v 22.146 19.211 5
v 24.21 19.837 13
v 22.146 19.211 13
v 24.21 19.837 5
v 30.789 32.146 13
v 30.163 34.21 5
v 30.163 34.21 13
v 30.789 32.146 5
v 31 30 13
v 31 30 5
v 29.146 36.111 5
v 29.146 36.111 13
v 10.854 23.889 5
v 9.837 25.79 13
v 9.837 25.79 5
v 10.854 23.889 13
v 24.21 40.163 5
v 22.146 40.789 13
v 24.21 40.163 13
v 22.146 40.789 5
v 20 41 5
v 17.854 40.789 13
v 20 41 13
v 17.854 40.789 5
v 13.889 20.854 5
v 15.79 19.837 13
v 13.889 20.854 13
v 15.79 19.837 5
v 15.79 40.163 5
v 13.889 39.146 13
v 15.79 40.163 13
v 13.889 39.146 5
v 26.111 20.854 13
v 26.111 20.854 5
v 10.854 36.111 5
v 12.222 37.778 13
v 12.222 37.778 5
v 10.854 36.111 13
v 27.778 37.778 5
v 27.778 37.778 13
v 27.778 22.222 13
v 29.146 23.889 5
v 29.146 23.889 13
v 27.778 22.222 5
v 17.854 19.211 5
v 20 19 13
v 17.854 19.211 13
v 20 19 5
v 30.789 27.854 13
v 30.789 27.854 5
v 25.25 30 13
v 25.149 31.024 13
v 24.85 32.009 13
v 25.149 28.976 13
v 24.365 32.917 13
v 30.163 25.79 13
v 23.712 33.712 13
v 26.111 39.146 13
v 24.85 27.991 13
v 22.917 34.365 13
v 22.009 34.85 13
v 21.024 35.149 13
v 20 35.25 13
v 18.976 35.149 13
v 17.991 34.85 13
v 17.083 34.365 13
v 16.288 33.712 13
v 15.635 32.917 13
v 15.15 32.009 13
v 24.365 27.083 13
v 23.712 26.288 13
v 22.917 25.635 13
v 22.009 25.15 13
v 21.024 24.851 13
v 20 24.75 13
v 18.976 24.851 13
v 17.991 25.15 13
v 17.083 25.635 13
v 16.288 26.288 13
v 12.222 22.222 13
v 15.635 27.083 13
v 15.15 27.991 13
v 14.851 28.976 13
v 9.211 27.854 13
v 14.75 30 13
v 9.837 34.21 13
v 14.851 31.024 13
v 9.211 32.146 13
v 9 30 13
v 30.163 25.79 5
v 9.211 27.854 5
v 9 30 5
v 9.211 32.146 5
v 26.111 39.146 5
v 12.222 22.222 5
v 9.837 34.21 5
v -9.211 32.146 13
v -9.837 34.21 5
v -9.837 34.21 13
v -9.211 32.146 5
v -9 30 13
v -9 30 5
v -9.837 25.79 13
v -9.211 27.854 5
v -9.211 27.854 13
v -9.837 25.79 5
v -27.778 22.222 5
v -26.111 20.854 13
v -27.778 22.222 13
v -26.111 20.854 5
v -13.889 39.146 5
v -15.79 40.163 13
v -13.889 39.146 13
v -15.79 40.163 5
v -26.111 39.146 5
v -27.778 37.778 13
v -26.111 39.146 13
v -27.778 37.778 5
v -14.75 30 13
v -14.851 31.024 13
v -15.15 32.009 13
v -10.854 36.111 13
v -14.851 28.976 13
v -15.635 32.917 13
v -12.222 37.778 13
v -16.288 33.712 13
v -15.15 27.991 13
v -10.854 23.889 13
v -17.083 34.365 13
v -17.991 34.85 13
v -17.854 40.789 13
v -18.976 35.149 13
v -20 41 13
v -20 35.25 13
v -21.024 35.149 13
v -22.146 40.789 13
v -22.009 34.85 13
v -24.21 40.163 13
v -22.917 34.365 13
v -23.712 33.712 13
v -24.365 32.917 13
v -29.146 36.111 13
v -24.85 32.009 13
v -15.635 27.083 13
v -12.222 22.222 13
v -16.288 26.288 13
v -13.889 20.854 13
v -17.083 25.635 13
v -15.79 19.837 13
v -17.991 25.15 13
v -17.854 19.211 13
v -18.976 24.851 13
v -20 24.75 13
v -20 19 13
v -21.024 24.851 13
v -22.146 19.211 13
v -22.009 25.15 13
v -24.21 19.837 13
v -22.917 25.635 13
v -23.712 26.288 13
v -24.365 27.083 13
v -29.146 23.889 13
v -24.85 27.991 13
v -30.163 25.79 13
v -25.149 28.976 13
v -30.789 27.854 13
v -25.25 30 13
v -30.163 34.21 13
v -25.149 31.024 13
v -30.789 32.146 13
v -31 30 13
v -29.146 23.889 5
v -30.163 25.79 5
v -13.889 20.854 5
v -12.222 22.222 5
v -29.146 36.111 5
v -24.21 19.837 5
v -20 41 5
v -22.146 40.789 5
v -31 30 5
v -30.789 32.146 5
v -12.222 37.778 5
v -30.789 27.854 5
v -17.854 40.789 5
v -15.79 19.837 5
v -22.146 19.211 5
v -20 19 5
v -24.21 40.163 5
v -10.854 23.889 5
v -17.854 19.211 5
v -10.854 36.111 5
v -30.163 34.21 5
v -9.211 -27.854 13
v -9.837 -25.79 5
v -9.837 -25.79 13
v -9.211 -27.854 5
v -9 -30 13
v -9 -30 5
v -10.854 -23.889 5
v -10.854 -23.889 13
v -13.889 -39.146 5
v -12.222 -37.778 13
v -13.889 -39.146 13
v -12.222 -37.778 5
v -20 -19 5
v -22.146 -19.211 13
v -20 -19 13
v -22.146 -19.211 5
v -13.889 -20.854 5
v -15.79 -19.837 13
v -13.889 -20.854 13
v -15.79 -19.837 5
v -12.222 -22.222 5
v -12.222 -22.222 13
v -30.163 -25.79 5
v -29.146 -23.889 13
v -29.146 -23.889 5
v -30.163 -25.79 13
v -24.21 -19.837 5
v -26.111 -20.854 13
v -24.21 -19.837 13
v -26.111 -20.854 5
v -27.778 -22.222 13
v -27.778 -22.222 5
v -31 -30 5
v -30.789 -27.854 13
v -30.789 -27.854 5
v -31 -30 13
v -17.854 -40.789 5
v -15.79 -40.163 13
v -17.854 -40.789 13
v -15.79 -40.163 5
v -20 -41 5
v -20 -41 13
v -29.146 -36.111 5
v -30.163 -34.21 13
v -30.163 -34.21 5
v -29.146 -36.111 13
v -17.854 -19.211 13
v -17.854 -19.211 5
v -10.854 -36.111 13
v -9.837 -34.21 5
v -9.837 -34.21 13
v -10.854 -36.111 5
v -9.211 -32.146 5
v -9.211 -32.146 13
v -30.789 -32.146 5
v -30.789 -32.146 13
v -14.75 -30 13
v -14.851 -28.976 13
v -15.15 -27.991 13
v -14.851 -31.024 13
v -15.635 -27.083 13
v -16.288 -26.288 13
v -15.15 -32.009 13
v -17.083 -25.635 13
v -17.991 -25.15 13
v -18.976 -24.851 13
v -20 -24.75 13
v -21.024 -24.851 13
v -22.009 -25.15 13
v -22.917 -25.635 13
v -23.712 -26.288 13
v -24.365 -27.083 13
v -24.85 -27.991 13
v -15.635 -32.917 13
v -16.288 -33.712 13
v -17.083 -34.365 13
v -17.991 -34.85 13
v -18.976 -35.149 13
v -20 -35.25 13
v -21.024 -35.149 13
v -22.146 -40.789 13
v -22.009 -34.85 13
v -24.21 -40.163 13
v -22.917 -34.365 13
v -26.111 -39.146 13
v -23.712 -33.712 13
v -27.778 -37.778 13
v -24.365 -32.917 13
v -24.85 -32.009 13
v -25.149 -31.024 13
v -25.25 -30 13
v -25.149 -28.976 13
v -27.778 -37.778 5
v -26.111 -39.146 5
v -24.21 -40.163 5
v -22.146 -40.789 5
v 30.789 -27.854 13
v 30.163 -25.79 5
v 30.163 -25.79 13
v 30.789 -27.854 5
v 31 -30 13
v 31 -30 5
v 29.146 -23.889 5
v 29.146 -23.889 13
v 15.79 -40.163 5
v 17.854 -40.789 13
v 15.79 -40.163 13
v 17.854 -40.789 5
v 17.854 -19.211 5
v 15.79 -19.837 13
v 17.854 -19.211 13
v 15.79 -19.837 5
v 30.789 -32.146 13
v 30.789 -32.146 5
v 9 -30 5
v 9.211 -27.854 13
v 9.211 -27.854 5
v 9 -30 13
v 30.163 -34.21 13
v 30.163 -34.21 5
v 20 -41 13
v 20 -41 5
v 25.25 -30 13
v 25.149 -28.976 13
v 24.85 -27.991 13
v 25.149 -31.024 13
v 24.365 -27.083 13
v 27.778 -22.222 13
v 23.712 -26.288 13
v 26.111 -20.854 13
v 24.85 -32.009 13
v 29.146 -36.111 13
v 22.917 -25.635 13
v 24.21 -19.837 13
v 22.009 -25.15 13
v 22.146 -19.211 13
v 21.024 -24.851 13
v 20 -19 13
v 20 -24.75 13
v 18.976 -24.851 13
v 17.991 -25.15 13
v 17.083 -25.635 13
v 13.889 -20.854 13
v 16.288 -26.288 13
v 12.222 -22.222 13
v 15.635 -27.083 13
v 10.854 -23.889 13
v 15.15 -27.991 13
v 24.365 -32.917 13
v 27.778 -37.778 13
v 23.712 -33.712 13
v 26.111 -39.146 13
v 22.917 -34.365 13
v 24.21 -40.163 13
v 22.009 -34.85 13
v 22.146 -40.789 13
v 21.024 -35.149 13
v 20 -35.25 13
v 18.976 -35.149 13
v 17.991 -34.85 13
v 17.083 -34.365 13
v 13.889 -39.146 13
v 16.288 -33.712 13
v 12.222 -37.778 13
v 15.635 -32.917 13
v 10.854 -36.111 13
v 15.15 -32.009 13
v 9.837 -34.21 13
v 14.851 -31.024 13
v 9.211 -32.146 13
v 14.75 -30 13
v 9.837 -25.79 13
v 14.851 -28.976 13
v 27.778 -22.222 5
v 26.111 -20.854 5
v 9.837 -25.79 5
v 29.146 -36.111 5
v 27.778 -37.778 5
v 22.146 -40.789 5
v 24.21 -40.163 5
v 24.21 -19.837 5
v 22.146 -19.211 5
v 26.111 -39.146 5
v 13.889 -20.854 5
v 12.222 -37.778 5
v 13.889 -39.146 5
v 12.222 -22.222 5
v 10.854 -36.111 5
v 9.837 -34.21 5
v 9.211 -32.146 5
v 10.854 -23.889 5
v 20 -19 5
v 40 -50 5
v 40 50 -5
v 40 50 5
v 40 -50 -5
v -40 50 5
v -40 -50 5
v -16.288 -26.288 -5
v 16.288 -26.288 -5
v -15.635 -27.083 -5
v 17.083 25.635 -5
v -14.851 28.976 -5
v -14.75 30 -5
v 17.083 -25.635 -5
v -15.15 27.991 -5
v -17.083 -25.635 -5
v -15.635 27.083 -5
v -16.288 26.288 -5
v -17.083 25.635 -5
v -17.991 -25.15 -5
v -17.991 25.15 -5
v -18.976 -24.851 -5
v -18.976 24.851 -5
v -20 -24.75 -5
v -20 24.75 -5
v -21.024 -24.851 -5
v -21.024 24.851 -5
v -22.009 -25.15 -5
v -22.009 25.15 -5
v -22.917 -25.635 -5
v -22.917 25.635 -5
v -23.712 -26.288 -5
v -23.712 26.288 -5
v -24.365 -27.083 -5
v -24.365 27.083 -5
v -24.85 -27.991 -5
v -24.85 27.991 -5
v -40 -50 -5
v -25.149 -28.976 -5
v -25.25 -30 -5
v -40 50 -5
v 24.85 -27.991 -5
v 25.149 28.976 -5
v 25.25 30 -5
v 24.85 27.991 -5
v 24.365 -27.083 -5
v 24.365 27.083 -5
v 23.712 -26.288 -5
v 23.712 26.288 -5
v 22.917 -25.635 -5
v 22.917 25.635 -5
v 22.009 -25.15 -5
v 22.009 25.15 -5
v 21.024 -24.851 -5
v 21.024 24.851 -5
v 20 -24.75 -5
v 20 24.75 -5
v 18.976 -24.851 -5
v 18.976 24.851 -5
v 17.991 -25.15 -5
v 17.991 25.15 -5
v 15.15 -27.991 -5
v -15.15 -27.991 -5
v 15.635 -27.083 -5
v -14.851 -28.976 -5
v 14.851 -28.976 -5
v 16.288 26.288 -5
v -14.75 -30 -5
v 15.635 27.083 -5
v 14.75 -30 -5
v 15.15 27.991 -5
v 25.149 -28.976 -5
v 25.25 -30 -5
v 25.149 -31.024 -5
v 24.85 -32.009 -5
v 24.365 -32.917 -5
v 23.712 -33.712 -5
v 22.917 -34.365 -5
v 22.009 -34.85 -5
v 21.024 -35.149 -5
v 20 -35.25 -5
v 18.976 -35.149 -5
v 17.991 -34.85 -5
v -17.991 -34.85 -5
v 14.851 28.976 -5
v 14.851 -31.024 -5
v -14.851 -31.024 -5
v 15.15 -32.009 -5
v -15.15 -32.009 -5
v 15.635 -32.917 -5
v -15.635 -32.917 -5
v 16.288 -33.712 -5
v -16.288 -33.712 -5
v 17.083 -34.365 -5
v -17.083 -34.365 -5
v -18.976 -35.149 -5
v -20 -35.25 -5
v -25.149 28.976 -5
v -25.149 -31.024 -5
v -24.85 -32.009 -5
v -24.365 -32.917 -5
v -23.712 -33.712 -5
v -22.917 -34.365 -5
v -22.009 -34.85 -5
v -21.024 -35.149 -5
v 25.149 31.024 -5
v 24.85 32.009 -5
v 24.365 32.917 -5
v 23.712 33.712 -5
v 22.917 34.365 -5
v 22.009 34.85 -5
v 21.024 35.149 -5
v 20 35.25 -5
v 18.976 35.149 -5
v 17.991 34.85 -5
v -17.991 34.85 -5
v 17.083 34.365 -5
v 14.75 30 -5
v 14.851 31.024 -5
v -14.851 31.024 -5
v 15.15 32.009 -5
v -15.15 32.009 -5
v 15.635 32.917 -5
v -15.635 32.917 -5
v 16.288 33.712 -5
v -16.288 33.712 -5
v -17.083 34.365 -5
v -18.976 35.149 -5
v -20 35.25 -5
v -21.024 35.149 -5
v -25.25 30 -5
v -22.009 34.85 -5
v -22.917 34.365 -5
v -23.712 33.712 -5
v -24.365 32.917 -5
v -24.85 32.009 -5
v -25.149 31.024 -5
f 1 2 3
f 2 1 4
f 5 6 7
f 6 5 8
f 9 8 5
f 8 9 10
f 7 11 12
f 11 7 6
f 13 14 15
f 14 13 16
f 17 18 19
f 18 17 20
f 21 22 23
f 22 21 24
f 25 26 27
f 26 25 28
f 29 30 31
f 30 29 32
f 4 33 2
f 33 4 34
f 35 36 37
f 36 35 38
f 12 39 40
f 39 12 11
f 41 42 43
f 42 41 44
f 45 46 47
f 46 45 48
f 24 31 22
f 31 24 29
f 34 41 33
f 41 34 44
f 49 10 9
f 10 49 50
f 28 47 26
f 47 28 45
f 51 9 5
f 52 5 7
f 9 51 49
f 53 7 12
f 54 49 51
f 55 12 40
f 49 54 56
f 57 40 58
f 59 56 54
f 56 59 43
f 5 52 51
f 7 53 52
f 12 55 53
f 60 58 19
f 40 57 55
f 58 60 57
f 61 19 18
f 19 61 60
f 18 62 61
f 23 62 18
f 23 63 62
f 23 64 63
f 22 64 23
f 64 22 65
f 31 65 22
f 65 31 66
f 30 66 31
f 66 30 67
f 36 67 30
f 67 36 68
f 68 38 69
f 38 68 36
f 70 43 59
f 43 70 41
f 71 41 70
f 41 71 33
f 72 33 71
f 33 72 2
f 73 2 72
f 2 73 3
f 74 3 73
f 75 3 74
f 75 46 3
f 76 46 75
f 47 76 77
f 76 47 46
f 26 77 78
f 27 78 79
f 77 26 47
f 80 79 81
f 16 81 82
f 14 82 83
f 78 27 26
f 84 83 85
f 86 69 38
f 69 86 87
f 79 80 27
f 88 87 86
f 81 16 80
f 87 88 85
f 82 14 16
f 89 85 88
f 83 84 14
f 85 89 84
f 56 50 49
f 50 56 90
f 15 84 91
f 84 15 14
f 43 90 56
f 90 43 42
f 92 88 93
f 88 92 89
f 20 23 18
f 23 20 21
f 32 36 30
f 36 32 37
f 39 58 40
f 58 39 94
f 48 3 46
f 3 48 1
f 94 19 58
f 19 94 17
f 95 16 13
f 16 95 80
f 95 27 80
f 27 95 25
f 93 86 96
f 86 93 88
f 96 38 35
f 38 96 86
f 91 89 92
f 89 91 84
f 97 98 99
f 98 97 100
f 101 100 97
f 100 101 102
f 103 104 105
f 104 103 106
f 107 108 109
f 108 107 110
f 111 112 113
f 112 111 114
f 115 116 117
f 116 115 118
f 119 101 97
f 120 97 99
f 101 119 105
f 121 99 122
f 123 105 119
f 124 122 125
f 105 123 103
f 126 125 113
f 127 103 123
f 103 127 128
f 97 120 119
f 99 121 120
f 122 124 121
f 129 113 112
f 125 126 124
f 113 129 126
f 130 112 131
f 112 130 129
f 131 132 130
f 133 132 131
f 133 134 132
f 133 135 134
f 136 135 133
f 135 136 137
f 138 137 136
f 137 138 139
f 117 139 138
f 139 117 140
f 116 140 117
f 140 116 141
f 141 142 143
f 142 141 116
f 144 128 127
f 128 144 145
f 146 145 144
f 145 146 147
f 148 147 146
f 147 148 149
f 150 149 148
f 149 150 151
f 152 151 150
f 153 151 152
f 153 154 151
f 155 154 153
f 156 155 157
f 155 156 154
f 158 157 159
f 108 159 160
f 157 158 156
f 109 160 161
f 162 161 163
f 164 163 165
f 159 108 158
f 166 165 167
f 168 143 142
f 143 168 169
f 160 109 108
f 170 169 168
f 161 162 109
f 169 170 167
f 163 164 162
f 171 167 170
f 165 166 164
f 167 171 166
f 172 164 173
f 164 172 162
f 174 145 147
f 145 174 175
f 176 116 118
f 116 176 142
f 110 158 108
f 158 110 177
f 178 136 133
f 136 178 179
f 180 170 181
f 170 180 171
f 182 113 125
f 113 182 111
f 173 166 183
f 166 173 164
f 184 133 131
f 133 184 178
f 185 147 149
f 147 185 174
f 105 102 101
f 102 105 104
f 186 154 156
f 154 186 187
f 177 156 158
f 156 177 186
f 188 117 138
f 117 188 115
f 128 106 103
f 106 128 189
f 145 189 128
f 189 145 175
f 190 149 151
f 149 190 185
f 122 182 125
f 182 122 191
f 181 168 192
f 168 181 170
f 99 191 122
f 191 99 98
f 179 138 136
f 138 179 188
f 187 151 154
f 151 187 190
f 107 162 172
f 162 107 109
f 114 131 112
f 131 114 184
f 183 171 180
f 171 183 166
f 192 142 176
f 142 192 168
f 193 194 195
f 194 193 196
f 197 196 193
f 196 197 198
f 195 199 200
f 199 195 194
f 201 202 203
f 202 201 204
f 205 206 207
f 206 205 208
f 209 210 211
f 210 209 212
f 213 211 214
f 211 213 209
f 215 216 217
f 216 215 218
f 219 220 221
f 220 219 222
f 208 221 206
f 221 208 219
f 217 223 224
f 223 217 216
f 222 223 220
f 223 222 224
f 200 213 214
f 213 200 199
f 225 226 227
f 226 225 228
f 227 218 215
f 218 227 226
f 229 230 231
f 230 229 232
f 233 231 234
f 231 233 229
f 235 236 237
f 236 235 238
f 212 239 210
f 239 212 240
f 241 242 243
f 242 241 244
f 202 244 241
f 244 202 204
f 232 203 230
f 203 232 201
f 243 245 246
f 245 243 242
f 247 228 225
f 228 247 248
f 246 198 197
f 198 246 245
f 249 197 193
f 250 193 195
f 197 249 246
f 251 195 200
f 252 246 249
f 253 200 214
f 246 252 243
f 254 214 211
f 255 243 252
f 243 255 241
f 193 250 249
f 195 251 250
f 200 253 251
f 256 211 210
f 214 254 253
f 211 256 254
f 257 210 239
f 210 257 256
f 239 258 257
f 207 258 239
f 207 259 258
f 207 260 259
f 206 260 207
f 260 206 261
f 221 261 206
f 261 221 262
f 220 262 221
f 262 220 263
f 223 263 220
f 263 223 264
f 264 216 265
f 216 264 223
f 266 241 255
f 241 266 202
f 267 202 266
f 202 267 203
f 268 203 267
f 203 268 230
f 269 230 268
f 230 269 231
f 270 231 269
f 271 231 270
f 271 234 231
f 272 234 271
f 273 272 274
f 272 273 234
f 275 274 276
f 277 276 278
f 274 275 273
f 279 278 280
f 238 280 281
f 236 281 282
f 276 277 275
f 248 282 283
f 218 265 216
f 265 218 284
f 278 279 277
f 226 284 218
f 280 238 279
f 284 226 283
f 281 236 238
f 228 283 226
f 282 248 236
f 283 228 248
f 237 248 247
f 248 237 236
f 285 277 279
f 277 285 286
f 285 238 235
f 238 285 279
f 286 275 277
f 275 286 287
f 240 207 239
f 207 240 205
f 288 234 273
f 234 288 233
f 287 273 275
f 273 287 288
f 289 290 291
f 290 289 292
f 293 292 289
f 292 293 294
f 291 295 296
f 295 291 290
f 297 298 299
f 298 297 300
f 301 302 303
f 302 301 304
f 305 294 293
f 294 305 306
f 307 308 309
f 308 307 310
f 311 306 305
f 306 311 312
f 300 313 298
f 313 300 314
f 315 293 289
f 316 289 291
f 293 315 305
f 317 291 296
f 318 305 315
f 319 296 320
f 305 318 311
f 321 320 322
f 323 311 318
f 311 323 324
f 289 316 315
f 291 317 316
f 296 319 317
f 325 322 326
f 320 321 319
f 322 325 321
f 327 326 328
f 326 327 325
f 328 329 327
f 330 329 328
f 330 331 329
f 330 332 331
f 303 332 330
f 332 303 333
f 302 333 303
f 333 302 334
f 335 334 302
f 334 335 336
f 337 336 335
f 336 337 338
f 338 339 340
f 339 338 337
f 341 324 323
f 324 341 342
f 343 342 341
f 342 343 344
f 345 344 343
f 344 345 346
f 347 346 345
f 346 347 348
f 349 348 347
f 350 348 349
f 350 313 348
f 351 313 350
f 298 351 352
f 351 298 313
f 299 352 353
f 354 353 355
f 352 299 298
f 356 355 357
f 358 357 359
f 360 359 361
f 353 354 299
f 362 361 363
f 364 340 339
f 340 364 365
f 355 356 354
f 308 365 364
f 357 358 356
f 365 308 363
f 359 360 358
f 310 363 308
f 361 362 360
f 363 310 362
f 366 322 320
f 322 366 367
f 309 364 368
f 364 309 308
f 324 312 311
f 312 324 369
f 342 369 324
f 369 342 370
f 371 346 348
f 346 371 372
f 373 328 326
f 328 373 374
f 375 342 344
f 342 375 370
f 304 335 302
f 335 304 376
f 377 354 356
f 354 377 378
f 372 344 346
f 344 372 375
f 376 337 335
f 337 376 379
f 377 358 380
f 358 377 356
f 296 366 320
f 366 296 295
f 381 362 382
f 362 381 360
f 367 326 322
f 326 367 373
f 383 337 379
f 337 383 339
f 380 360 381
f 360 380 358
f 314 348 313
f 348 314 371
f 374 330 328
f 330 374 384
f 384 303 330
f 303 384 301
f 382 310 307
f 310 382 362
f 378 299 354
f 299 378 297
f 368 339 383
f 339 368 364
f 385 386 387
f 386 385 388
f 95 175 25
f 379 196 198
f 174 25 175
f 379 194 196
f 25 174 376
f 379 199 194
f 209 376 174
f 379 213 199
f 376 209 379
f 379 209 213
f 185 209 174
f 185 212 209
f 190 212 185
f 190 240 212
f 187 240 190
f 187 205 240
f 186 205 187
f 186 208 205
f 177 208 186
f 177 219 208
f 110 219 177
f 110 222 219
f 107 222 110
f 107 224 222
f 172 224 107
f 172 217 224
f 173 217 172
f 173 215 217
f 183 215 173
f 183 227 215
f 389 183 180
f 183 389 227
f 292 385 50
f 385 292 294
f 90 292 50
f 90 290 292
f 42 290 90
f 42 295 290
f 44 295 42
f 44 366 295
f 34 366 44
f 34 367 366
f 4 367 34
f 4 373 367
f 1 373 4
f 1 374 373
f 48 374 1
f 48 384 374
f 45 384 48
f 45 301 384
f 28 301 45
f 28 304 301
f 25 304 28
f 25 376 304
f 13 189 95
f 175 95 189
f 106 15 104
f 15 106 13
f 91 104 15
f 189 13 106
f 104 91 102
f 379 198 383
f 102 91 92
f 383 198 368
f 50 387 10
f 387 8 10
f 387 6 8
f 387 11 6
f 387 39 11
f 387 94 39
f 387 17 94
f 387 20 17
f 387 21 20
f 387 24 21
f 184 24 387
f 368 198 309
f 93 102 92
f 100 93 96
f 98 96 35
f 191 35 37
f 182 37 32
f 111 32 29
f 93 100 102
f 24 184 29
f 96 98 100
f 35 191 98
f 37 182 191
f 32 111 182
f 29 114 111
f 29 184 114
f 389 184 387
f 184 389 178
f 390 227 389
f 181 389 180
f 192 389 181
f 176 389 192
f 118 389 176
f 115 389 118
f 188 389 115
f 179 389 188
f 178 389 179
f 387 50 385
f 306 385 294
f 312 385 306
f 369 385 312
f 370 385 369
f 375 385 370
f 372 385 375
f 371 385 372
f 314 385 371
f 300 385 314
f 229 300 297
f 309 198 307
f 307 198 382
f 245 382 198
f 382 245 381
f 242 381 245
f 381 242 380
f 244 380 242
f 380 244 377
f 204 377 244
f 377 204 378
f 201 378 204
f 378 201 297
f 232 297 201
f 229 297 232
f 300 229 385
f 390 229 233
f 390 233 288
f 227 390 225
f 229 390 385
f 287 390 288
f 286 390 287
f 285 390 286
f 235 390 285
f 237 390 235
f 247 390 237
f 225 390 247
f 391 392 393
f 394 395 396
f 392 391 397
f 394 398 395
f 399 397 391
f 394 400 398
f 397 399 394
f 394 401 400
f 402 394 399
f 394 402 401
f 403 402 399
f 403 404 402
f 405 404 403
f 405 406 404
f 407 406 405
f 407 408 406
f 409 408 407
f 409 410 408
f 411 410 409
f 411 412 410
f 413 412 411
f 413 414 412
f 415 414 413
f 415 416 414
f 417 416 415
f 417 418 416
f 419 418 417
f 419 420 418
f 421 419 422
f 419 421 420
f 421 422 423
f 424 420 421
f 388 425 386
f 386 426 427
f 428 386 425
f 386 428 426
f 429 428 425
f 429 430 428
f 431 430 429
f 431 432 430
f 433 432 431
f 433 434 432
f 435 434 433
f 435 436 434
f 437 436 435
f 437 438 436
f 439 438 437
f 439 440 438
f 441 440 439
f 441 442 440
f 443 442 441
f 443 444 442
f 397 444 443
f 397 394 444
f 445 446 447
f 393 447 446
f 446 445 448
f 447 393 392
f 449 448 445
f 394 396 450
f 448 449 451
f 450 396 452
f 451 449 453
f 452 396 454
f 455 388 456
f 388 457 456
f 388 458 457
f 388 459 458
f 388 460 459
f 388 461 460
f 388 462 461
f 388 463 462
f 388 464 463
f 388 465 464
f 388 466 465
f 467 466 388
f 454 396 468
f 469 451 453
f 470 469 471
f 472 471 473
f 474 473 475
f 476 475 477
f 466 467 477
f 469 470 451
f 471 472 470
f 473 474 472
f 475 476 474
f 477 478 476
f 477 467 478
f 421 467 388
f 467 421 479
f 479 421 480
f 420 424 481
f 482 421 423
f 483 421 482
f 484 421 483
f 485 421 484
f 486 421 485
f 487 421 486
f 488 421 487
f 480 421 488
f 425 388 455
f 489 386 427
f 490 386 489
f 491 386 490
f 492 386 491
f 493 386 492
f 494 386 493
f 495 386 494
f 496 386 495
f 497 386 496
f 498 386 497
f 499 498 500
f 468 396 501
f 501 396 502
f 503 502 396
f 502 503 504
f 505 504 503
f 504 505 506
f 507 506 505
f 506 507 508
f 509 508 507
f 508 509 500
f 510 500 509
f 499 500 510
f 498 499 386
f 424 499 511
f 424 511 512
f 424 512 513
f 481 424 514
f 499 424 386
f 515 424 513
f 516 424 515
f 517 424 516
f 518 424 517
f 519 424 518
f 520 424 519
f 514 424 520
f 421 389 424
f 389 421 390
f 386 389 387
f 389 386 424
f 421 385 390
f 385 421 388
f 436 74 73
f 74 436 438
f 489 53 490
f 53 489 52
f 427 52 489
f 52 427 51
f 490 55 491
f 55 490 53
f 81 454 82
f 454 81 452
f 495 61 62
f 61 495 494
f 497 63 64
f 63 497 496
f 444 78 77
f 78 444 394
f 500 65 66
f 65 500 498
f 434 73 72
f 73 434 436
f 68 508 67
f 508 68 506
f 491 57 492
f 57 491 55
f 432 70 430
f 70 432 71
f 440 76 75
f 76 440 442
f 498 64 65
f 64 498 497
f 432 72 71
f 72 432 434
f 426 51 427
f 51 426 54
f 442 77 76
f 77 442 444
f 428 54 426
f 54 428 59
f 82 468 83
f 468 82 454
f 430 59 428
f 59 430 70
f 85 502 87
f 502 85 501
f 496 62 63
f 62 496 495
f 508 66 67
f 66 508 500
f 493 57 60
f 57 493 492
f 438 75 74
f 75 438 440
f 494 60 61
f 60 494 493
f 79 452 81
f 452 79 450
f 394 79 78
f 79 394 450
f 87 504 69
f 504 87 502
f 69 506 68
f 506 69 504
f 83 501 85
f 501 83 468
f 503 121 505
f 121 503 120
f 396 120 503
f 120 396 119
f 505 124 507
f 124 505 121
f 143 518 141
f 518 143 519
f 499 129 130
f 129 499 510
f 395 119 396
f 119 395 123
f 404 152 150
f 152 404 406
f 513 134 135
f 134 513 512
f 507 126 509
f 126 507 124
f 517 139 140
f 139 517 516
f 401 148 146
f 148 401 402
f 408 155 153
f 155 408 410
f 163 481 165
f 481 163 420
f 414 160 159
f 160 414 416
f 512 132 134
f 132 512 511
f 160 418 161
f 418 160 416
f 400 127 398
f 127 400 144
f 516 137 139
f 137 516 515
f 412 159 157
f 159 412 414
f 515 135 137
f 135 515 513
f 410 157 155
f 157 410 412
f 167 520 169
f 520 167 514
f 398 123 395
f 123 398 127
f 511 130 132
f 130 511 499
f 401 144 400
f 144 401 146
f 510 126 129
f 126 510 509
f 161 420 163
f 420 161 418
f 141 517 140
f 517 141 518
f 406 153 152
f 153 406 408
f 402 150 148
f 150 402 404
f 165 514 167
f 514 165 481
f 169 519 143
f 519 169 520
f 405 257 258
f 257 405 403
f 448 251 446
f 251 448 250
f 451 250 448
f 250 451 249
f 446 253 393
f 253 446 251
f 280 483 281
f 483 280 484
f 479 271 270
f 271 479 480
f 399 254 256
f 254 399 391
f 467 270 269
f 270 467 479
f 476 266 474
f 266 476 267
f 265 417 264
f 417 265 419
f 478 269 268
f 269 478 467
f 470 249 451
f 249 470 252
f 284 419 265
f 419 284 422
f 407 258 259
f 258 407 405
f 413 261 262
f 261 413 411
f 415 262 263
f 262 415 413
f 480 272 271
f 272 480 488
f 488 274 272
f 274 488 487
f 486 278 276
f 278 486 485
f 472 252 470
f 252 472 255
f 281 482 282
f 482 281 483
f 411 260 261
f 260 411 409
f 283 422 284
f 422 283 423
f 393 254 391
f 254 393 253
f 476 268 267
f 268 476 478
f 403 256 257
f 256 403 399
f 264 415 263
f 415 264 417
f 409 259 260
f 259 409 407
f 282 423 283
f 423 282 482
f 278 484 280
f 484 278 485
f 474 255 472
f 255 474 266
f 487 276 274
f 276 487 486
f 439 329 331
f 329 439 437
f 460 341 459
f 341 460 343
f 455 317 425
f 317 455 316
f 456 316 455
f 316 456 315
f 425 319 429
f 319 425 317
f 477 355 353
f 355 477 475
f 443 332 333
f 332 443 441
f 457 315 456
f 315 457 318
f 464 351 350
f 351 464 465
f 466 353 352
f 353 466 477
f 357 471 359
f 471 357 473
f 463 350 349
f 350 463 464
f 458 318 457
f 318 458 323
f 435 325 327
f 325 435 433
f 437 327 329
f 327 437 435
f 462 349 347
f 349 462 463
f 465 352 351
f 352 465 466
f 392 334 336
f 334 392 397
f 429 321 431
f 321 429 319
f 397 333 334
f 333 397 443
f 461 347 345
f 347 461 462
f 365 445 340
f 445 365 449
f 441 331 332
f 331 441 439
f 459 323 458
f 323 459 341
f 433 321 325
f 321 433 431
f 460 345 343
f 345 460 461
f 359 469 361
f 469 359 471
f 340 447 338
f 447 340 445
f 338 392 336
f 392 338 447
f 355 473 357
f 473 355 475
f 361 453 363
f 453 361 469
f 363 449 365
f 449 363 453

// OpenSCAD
$fn = 32;

// ----------------------------------------------------------------------
// Anchor pads 80 x 100 x 18
// four corner bosses with anchor holes
// ----------------------------------------------------------------------

// --- parameters (mm) ---
plate = [80, 100, 10];  // base plate size (x, y, z)
pads = 4;               // boss count, one per corner
edge = 20;              // boss centre offset from the plate edge
boss_d = 22;            // boss diameter
boss_h = 8;             // boss height above the base plate
hole_d = 10.5;          // hole diameter

// --- derived feature positions (mm) ---
height = plate[2] + boss_h;      // = 18   overall height of the part
corner_x = plate[0] / 2 - edge;  // = 20   boss centre X
corner_y = plate[1] / 2 - edge;  // = 30   boss centre Y
feature_centers = [
  [corner_x, corner_y],
  [-corner_x, corner_y],
  [-corner_x, -corner_y],
  [corner_x, -corner_y]
];   // boss centres, anchor holes are drilled there

// base plate, four bosses standing on it, anchor holes all the way through
difference() {
  union() {
    cube(plate, center = true);
    for (centre = feature_centers)
      translate([centre[0], centre[1], plate[2] / 2 - 1])
        cylinder(d = boss_d, h = boss_h + 1);
  }
  for (centre = feature_centers)
    translate([centre[0], centre[1], -height])
      cylinder(d = hole_d, h = 2 * height + 2);  // through boss and plate
}
